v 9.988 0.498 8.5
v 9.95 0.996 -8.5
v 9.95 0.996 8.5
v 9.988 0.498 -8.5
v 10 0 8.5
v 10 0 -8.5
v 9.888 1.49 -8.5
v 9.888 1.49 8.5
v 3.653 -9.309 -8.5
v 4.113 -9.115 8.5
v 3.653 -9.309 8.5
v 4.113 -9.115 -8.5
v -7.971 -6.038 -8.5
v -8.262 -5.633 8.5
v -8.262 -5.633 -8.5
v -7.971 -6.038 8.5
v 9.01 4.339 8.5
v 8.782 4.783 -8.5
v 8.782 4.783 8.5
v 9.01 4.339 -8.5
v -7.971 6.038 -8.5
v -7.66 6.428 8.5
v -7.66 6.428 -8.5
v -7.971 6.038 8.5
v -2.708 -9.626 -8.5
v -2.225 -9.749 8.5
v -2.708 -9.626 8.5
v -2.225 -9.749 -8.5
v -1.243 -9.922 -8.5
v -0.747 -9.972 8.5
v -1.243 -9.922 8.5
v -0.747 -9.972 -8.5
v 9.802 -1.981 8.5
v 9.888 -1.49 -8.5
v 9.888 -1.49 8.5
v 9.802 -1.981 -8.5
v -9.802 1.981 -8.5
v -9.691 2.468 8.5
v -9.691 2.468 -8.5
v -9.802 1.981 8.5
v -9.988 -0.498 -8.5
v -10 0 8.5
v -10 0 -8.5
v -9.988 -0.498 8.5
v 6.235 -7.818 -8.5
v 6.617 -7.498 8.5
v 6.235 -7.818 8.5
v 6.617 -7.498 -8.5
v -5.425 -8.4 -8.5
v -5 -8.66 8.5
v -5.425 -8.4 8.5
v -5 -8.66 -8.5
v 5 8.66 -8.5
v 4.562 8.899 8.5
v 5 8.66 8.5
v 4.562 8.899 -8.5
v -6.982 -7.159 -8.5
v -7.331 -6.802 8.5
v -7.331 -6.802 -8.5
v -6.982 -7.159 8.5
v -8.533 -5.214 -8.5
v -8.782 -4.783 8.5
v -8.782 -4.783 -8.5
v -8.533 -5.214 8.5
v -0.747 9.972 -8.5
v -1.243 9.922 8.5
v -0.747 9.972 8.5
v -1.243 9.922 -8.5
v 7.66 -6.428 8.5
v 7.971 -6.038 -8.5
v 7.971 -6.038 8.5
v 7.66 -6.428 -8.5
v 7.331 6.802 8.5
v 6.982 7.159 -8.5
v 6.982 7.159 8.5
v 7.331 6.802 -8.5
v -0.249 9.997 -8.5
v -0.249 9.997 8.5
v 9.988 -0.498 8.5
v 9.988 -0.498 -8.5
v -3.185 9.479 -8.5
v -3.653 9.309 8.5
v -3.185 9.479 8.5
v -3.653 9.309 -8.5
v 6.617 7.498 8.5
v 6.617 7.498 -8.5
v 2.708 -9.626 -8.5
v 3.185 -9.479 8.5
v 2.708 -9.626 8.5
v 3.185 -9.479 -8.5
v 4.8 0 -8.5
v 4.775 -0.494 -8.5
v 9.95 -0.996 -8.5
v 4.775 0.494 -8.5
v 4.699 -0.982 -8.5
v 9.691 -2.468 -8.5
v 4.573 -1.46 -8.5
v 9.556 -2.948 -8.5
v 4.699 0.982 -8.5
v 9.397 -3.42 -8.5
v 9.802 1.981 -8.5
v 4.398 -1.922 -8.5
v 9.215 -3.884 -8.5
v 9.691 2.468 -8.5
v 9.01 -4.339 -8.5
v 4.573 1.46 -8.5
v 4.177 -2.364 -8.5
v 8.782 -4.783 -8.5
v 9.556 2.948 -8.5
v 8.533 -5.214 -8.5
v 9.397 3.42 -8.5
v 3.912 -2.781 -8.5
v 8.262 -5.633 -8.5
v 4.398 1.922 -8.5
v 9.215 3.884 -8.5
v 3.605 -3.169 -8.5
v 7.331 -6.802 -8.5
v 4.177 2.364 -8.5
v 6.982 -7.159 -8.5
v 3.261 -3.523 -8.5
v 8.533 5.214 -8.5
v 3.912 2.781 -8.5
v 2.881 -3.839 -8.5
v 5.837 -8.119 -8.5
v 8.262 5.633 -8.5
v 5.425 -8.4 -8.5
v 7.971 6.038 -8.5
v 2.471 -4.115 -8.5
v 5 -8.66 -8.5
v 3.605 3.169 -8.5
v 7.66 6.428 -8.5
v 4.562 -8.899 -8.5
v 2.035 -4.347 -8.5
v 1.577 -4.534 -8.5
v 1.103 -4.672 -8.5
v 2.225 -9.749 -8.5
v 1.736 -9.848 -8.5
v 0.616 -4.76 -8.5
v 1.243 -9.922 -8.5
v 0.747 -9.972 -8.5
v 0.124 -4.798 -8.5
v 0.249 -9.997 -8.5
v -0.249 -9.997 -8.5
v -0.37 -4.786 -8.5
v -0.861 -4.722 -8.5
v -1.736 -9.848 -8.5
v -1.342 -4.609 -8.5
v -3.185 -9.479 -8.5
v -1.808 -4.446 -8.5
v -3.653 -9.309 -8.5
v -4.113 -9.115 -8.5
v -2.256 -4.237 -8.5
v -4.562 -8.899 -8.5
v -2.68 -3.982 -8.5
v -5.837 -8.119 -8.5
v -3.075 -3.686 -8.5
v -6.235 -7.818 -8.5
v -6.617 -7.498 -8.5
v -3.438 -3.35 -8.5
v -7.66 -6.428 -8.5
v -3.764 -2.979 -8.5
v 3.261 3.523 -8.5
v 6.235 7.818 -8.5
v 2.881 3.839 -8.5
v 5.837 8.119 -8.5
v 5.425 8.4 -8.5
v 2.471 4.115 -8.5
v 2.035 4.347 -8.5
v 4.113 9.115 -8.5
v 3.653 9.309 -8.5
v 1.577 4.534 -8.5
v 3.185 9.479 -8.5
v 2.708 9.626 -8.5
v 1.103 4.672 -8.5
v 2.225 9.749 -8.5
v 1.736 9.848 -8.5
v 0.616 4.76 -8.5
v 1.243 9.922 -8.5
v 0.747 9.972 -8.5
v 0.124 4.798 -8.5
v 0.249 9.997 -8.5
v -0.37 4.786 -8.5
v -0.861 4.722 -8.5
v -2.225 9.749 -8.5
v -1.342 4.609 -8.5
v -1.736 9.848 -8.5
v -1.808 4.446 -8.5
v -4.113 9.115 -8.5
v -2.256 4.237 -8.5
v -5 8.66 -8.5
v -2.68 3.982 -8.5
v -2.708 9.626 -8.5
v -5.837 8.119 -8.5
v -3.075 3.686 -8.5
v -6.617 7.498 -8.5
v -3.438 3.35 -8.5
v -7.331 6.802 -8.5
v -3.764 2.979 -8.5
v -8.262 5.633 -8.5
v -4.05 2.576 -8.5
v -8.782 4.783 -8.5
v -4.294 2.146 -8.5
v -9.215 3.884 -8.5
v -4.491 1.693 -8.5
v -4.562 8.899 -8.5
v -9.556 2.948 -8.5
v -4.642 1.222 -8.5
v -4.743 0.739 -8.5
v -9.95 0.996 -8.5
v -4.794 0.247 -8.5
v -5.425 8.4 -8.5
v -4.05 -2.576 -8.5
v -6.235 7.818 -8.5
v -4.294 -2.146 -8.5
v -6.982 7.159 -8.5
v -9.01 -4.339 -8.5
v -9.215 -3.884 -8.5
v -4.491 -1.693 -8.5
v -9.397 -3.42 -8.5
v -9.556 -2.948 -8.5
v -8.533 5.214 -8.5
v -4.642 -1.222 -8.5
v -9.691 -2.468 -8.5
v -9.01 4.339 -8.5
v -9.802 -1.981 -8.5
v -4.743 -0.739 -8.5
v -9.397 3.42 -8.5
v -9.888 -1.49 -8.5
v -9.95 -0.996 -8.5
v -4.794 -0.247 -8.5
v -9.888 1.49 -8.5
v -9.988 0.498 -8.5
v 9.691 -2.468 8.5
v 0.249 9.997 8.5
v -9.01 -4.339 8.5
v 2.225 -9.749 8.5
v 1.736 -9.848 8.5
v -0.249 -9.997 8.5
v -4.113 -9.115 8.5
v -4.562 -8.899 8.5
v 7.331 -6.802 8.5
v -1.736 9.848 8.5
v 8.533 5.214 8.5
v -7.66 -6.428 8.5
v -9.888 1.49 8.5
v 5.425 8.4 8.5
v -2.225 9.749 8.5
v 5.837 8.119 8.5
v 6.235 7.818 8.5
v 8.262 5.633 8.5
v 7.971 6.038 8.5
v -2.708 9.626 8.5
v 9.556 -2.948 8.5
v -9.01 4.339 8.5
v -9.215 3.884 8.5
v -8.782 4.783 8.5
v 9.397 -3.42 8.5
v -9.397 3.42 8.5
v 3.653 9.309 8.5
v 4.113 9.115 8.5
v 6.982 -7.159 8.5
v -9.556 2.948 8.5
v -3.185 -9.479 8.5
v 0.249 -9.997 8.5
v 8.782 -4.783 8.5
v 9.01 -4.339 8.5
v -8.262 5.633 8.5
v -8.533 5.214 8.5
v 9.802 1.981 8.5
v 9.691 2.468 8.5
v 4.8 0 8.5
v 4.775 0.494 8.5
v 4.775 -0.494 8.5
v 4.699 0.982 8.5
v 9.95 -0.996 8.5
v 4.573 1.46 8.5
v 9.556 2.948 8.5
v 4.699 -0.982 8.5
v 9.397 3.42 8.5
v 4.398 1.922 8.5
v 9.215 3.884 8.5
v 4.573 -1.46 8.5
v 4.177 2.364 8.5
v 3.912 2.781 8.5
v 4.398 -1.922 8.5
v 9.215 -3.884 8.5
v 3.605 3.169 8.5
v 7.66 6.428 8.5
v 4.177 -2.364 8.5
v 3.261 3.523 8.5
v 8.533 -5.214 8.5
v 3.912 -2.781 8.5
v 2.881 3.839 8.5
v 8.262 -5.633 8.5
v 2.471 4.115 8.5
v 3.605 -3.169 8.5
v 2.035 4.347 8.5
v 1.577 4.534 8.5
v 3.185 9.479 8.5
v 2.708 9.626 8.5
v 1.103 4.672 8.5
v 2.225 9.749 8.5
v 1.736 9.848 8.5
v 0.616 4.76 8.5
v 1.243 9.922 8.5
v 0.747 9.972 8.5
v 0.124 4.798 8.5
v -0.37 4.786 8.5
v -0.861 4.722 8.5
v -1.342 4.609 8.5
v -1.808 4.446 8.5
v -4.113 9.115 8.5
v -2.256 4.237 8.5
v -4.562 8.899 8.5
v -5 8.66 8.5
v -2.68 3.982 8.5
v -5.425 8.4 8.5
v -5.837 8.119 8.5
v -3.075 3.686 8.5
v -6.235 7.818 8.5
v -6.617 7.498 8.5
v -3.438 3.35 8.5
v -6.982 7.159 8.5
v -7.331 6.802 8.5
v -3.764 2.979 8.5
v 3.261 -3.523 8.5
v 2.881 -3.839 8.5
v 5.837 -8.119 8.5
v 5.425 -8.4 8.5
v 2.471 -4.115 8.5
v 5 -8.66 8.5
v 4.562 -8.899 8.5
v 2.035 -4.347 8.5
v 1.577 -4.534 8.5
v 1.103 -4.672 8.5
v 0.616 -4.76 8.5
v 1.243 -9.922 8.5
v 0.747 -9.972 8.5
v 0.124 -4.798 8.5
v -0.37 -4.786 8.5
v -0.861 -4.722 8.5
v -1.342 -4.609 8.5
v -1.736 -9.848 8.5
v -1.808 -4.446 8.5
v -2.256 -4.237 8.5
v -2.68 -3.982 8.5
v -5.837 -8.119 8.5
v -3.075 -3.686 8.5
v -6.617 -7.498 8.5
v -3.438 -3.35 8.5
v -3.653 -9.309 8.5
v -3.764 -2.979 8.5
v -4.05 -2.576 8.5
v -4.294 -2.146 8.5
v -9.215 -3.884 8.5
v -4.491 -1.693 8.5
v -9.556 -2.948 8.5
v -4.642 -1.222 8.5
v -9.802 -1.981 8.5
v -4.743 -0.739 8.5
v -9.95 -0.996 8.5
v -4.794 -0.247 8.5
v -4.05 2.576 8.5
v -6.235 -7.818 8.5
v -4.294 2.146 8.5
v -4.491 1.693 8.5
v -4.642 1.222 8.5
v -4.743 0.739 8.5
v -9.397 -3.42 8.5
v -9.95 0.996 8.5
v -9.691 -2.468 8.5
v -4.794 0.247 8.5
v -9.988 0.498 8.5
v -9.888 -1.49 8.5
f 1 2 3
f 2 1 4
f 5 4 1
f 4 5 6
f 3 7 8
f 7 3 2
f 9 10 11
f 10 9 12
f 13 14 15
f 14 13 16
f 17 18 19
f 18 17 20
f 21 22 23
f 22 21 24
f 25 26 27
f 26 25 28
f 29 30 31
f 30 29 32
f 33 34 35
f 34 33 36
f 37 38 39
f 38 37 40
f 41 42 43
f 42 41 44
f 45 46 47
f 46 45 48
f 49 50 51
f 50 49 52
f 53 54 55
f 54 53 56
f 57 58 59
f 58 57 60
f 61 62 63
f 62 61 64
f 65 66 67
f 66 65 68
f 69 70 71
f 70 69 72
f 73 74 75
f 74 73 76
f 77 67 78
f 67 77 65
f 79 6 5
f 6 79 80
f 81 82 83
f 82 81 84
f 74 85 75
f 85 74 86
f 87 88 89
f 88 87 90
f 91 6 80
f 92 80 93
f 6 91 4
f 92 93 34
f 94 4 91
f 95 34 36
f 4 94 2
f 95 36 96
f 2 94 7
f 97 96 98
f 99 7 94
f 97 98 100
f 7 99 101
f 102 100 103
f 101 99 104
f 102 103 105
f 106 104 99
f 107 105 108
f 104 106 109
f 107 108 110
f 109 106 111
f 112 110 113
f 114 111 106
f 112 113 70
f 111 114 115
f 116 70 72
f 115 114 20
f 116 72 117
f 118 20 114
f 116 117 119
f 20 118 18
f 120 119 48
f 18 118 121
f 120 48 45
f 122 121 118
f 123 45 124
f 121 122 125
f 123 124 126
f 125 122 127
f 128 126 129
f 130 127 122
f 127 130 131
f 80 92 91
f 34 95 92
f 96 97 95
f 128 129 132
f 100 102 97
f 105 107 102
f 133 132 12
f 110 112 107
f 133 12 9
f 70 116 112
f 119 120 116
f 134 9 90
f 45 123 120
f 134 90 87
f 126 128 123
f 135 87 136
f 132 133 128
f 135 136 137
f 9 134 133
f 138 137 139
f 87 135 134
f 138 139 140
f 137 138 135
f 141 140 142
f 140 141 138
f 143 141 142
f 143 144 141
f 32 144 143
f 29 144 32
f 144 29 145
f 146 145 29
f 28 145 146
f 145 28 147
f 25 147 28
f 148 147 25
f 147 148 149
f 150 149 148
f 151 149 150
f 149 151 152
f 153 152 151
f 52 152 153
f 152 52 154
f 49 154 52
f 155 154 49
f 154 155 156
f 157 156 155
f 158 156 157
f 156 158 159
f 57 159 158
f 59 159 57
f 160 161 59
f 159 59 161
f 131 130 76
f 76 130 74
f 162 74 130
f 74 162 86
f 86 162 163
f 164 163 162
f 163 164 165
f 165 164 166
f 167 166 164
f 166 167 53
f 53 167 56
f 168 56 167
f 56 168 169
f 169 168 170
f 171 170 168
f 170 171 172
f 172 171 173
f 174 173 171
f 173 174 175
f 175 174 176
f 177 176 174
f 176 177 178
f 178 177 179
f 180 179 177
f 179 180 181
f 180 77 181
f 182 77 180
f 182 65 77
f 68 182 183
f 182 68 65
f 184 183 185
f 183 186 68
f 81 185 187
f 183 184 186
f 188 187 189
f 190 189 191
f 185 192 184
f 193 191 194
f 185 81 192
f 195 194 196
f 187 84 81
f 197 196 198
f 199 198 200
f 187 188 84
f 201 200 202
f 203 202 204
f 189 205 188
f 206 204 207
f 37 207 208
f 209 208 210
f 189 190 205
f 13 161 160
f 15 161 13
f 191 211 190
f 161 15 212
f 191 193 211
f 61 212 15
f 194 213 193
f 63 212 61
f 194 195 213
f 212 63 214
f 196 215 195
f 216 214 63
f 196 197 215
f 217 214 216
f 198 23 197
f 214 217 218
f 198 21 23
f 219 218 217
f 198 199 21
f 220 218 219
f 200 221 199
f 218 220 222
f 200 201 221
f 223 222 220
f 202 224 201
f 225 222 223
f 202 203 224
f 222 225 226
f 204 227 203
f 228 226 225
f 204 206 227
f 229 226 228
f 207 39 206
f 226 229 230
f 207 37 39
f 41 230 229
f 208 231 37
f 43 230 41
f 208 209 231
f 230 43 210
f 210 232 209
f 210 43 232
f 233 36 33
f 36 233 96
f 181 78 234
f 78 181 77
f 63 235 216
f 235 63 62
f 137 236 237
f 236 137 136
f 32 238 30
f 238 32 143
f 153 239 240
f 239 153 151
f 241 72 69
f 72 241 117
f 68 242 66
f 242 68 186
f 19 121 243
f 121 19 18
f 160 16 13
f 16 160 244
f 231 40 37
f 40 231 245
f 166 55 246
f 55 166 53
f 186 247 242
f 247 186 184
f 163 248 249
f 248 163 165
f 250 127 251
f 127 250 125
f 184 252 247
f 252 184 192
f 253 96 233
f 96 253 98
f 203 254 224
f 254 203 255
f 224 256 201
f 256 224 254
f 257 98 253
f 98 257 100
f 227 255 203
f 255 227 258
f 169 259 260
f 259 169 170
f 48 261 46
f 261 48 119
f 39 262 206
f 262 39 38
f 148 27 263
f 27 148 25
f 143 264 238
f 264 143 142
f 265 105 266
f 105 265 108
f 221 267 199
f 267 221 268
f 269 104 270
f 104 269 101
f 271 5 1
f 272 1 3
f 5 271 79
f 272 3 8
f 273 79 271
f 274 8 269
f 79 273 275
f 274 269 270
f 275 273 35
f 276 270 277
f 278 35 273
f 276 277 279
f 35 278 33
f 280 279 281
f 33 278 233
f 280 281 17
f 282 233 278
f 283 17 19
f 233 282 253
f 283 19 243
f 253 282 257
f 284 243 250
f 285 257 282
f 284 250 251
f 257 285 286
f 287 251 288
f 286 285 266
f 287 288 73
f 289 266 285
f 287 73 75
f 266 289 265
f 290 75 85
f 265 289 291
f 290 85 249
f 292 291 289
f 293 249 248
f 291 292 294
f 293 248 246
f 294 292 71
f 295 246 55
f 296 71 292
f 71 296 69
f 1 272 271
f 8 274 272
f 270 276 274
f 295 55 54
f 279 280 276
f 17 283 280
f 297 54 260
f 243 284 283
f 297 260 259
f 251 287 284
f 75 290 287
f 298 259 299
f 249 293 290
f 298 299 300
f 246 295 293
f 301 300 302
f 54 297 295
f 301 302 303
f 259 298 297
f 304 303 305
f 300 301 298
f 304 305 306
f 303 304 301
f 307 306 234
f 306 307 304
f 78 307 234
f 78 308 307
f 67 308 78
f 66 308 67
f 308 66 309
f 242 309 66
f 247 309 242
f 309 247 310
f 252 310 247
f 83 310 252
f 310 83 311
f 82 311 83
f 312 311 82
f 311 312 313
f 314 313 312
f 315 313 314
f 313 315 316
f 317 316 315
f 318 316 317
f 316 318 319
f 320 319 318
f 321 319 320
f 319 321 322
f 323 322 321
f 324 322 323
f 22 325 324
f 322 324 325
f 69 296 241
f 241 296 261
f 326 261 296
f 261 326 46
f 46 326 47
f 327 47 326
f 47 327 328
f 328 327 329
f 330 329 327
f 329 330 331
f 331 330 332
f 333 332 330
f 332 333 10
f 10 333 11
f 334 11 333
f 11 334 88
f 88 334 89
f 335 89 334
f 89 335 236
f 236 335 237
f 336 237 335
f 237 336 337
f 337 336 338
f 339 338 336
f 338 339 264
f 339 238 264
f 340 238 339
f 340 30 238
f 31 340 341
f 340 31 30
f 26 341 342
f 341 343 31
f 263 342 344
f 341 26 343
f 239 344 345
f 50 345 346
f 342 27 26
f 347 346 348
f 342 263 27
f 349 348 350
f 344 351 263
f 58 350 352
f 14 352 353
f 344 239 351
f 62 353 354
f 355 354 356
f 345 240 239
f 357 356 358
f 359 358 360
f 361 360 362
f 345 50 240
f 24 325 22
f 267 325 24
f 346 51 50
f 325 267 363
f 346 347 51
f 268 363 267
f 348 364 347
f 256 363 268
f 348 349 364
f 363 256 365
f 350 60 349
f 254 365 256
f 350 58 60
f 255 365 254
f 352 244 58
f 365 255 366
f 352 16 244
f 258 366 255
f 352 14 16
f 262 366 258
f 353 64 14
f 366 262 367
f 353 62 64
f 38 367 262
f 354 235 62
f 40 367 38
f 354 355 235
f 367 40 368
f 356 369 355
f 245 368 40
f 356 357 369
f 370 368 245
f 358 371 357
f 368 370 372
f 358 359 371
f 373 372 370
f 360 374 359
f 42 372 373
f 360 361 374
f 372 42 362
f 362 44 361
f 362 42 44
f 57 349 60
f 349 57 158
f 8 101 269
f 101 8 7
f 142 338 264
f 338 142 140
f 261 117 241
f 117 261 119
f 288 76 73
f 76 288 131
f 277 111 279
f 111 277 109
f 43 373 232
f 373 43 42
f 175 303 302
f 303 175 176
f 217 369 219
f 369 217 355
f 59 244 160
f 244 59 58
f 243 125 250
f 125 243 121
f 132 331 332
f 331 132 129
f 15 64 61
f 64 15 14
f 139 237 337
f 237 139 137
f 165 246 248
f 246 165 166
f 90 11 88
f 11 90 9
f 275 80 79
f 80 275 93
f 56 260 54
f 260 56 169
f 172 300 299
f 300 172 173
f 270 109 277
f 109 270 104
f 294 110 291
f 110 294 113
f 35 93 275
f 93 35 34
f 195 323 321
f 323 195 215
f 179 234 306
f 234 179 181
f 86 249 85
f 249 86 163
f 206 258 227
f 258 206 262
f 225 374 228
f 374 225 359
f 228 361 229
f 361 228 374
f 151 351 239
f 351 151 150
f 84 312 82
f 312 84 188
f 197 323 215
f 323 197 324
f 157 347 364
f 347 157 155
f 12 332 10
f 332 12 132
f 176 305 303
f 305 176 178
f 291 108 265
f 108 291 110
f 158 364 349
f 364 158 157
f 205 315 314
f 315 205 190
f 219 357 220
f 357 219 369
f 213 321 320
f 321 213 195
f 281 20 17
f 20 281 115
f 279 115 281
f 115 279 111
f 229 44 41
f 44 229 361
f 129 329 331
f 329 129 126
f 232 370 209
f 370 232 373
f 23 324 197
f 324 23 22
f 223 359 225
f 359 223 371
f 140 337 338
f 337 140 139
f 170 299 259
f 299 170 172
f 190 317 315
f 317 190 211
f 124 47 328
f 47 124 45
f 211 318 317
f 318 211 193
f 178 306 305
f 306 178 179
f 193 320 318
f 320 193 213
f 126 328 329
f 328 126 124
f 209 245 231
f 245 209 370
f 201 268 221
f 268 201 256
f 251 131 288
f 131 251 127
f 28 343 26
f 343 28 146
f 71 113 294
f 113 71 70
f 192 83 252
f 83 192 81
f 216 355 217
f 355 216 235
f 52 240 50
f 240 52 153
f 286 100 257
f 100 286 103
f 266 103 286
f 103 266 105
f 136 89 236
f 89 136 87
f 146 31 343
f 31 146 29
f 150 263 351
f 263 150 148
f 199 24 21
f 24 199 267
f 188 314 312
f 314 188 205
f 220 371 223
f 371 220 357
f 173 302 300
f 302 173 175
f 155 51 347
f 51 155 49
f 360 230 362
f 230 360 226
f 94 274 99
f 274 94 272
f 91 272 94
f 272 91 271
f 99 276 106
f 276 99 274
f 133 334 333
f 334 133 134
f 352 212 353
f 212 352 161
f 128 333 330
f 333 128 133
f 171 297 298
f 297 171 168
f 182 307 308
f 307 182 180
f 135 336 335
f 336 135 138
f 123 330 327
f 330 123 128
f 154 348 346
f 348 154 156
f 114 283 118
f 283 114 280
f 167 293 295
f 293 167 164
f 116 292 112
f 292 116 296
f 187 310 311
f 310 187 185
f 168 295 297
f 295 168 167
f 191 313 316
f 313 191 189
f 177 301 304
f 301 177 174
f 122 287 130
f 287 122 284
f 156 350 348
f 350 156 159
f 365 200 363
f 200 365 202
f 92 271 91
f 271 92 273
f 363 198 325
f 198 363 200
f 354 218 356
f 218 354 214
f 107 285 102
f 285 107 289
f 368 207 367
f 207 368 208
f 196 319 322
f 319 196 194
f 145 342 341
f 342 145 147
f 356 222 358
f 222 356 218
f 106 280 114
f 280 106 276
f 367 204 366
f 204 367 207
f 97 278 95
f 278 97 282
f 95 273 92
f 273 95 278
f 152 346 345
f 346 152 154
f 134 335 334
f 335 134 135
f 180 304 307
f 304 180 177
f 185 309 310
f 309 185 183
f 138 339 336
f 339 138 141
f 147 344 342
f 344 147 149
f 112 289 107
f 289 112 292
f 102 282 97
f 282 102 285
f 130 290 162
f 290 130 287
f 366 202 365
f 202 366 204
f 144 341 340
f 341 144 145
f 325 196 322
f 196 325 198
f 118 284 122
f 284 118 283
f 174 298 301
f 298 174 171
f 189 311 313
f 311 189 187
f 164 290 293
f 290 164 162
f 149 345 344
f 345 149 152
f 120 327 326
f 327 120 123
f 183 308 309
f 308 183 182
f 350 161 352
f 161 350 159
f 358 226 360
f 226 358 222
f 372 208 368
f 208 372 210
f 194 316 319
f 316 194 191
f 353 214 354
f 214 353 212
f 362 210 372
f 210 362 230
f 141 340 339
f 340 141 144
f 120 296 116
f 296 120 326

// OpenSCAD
//Adaptador 20mm para 9,55mm por 20mm de altura
$fa=1; 
$fs=0.5;

module adaptador(){
    difference (){
        // Raio 10 e Altura 17
        cylinder ( r = 10 , h = 17 , center = true);
        #cylinder ( r = 9.60 / 2 , h = 22 , center = true) ;
    }
}



adaptador();
